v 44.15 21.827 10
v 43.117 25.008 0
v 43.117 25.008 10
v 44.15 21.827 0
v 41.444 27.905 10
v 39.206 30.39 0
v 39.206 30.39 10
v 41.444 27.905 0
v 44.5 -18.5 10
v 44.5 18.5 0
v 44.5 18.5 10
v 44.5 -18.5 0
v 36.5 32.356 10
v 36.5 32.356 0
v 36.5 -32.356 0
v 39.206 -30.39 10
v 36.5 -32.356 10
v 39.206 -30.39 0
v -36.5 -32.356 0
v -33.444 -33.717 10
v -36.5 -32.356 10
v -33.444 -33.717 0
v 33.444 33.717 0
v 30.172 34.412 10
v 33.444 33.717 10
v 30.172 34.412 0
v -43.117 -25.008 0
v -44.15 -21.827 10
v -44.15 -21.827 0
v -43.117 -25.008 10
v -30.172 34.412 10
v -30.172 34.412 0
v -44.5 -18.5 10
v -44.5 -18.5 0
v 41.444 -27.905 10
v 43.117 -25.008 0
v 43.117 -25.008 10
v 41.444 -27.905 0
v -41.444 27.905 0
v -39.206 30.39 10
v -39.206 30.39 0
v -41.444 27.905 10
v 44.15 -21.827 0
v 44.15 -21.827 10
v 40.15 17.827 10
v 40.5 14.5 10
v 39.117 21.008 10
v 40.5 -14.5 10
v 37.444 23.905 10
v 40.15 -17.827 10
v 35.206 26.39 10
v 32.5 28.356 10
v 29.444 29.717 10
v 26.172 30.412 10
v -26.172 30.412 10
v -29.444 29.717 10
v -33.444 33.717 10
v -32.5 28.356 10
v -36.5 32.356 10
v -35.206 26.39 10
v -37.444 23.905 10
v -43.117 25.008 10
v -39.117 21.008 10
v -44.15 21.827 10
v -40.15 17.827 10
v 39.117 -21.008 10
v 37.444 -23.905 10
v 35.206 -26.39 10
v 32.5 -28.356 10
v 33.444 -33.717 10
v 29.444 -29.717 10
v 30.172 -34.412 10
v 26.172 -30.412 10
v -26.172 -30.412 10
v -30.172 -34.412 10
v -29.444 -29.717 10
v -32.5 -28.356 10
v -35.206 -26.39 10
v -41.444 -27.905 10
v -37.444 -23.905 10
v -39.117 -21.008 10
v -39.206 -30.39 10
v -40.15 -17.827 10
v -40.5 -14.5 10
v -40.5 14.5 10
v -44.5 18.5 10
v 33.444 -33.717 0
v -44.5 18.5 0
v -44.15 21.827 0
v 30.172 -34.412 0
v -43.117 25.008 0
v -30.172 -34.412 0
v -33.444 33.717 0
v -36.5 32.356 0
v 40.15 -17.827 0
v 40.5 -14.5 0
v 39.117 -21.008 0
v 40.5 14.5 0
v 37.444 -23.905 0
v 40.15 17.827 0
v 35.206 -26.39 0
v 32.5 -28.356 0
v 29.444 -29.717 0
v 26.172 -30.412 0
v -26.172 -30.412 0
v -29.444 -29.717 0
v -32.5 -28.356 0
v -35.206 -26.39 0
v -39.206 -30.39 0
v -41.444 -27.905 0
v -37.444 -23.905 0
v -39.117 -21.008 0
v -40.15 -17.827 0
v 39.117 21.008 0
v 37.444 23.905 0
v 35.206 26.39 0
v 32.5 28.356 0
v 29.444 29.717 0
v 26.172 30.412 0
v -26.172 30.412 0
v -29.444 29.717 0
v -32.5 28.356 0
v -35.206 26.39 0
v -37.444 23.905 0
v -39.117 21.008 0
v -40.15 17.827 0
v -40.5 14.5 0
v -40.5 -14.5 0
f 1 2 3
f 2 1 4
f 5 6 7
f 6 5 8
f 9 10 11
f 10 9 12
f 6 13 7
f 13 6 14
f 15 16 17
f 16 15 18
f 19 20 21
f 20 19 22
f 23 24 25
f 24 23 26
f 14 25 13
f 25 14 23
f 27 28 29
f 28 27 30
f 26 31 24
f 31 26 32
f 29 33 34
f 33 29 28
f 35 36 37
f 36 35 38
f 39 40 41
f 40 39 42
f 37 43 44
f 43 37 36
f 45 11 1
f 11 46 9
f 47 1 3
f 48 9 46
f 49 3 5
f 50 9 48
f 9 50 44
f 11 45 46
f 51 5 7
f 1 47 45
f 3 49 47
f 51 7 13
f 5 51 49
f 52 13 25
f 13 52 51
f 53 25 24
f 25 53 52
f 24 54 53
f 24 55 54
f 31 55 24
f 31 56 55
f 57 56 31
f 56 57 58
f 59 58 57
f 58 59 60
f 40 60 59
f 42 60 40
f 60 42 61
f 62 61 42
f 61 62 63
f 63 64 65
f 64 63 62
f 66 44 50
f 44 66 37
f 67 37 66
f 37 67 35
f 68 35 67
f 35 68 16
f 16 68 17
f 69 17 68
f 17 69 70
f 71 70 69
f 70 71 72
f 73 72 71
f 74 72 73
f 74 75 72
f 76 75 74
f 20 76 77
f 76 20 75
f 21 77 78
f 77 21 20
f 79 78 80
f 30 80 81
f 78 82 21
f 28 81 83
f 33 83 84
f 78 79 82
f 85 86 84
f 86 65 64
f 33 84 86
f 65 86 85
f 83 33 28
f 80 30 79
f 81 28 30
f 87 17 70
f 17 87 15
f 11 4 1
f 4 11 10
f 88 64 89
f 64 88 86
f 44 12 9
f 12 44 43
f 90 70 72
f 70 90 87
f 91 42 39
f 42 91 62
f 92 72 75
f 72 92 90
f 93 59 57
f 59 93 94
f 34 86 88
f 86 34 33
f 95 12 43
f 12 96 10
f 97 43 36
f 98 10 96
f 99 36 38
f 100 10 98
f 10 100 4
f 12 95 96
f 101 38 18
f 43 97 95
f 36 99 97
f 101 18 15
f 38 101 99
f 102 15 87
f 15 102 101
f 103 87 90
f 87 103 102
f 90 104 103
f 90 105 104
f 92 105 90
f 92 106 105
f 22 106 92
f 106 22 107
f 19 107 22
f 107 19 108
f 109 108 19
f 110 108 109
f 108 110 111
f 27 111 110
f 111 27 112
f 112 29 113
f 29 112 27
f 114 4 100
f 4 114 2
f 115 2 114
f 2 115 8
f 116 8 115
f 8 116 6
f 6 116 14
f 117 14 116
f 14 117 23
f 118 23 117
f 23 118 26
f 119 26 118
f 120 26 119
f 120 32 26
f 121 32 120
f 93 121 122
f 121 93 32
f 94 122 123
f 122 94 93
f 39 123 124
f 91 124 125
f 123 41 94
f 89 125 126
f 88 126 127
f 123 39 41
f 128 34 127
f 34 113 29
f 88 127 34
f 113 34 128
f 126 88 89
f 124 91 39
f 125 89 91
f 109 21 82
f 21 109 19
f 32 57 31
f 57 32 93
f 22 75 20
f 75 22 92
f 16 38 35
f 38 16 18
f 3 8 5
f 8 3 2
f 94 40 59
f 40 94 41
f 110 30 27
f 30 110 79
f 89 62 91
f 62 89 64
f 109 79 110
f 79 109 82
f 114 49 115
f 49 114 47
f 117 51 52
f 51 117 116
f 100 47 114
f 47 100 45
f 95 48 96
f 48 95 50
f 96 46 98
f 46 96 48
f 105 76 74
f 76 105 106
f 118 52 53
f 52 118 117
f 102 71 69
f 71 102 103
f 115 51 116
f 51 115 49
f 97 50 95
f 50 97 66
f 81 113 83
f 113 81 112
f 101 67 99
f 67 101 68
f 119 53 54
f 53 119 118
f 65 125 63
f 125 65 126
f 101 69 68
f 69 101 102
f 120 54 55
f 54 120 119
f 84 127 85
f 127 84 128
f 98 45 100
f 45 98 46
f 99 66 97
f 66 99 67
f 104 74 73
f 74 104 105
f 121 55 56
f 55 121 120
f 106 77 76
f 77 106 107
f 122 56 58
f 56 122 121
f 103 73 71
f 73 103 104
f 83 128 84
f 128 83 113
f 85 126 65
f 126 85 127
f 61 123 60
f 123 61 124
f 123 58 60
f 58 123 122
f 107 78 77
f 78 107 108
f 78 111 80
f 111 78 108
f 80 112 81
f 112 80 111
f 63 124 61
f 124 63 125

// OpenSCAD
outerwidth1 = 78;
outerheight1 = 58;
height1 = 110;
wallThickness1 = 8;

outerwidth2 = 73;
outerheight2 = 53;
height2 = 100;
wallThickness2 = 8;

minkowski_circle = 16;


squareTube(outerwidth2,outerheight2,wallThickness2,10);

module squareTube(outerwidth, outerheight, wallThickness, height)
{
        //linear_extrude(height,true)
    difference()
    {
        linear_extrude(height,true)
        minkowski()
        {
        square([outerwidth-minkowski_circle, outerheight-minkowski_circle],true);
            circle(minkowski_circle);
        }
        translate([0,0,-2],true)
        linear_extrude(height+4,true)
        minkowski()
        {
        square([outerwidth-wallThickness-minkowski_circle,outerheight-wallThickness-minkowski_circle],true);
                        circle(minkowski_circle);
        }
    }
}

module solidTube(outerwidth, outerheight, wallThickness, height)
{
    linear_extrude(height,true)
    minkowski()
    {
        square([outerwidth-minkowski_circle, outerheight-minkowski_circle],true);
        circle(minkowski_circle);
    }
}
